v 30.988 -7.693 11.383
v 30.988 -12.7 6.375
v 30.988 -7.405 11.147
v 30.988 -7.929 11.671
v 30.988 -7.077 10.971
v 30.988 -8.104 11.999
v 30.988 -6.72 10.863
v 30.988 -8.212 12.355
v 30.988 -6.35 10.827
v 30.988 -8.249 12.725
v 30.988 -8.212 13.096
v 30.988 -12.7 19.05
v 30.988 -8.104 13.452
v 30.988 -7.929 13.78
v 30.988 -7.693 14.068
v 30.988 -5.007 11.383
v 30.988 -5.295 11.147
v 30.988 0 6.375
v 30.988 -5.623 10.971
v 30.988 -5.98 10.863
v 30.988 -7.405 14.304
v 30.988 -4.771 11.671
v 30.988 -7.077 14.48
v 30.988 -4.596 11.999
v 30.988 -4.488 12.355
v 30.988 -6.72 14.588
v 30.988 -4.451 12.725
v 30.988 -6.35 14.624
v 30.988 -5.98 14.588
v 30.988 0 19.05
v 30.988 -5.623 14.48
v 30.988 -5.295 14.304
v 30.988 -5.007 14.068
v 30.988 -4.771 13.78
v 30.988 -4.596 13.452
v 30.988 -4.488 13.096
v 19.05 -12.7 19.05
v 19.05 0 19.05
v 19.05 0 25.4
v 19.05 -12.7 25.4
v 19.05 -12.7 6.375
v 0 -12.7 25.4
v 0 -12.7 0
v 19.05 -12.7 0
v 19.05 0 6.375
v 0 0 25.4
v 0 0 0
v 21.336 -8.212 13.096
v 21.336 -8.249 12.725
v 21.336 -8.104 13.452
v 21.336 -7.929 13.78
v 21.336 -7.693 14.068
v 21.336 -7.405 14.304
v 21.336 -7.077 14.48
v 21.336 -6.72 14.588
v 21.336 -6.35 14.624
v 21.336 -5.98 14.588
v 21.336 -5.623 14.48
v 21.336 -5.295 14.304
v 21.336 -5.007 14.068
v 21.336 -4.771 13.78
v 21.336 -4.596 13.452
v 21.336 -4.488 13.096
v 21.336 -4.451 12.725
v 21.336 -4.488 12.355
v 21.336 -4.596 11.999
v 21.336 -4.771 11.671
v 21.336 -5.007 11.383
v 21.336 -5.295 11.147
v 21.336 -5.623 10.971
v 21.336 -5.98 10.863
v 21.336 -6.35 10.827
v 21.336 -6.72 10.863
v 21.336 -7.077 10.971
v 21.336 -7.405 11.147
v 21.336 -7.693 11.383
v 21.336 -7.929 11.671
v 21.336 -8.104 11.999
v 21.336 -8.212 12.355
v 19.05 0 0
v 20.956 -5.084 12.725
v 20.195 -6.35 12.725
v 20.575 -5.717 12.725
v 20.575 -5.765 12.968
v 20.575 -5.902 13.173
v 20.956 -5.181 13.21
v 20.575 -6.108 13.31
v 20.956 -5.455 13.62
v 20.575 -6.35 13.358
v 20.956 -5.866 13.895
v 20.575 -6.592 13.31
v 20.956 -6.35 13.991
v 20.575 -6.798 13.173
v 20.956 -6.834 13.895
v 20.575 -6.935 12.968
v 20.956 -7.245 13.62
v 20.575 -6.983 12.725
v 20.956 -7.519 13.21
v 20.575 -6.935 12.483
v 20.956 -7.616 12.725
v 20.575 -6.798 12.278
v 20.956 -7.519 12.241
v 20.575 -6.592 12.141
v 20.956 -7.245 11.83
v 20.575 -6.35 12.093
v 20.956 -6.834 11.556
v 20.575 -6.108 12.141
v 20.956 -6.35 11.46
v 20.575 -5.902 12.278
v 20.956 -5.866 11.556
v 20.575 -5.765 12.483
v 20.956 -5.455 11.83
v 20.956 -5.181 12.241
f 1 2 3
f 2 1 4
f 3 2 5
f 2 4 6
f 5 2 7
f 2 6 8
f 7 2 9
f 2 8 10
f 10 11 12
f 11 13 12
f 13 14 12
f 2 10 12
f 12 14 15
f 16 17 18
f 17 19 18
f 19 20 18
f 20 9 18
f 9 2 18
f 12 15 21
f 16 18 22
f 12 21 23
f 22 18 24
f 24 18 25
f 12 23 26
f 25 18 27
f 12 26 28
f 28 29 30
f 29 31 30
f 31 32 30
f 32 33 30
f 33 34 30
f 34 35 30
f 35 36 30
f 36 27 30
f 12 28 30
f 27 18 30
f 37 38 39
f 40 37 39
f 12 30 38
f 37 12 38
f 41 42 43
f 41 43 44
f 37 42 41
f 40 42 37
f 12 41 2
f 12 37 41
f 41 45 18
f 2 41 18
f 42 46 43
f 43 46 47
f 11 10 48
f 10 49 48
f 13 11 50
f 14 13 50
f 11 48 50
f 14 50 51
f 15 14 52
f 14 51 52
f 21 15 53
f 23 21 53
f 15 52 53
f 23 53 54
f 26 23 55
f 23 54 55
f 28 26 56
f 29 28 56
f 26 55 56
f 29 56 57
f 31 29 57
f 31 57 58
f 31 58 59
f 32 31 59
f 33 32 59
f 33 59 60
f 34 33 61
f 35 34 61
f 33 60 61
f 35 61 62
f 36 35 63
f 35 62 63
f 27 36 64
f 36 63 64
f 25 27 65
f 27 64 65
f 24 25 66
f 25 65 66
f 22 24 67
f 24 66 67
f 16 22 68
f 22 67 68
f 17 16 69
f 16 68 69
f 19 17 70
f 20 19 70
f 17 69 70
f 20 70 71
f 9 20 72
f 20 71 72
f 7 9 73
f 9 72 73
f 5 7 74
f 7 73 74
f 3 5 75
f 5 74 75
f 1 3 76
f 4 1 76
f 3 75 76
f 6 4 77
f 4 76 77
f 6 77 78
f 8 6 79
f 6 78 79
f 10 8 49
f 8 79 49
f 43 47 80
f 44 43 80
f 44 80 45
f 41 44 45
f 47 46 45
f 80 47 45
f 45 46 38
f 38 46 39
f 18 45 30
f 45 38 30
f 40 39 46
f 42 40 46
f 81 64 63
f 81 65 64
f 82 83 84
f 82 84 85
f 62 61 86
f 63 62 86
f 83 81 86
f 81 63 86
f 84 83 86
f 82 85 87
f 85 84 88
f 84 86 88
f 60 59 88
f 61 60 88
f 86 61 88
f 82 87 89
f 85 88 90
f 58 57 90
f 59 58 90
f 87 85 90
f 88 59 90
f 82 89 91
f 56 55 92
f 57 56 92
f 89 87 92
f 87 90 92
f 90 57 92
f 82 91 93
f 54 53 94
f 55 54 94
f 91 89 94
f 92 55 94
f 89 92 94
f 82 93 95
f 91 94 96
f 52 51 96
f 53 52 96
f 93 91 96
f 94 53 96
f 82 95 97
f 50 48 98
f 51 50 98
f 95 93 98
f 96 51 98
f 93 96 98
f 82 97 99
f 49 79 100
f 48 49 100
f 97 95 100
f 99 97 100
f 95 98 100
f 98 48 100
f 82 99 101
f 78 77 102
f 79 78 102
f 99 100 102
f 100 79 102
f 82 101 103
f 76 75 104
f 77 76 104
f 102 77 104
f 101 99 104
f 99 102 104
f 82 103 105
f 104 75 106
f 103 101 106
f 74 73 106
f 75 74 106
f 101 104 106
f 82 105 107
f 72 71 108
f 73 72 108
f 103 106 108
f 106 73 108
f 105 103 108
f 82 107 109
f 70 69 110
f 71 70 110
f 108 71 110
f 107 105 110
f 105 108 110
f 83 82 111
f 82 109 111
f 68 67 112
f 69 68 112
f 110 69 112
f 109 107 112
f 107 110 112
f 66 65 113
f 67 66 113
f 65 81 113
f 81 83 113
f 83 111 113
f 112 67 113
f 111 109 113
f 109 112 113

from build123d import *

# Parameters (mm, degrees)
F1_DEPTH = 12.7
F3_D     = 3.7973
F3_DEPTH = 9.652
F3_TIP   = 1.1408240143


with BuildPart() as f1:
    # F0 (on Front) → F1 (new body)
    with BuildSketch(Plane.XZ):
        Polygon((0, 25.4), (0, 0), (19.05, 0), (19.05, 6.3754), (30.988, 6.3754), (30.988, 19.05), (19.05, 19.05), (19.05, 25.4), align=None)
    extrude(amount=F1_DEPTH)

    # F3
    with Locations(Plane.YZ.offset(30.988)):
        with Locations((-6.35, 12.7254)):
            Hole(F3_D / 2, depth=F3_DEPTH)
            with Locations((0, 0, -(F3_DEPTH + F3_TIP / 2))):  # 118° drill point
                Cone(0, F3_D / 2, F3_TIP, mode=Mode.SUBTRACT)


solid = f1.part
